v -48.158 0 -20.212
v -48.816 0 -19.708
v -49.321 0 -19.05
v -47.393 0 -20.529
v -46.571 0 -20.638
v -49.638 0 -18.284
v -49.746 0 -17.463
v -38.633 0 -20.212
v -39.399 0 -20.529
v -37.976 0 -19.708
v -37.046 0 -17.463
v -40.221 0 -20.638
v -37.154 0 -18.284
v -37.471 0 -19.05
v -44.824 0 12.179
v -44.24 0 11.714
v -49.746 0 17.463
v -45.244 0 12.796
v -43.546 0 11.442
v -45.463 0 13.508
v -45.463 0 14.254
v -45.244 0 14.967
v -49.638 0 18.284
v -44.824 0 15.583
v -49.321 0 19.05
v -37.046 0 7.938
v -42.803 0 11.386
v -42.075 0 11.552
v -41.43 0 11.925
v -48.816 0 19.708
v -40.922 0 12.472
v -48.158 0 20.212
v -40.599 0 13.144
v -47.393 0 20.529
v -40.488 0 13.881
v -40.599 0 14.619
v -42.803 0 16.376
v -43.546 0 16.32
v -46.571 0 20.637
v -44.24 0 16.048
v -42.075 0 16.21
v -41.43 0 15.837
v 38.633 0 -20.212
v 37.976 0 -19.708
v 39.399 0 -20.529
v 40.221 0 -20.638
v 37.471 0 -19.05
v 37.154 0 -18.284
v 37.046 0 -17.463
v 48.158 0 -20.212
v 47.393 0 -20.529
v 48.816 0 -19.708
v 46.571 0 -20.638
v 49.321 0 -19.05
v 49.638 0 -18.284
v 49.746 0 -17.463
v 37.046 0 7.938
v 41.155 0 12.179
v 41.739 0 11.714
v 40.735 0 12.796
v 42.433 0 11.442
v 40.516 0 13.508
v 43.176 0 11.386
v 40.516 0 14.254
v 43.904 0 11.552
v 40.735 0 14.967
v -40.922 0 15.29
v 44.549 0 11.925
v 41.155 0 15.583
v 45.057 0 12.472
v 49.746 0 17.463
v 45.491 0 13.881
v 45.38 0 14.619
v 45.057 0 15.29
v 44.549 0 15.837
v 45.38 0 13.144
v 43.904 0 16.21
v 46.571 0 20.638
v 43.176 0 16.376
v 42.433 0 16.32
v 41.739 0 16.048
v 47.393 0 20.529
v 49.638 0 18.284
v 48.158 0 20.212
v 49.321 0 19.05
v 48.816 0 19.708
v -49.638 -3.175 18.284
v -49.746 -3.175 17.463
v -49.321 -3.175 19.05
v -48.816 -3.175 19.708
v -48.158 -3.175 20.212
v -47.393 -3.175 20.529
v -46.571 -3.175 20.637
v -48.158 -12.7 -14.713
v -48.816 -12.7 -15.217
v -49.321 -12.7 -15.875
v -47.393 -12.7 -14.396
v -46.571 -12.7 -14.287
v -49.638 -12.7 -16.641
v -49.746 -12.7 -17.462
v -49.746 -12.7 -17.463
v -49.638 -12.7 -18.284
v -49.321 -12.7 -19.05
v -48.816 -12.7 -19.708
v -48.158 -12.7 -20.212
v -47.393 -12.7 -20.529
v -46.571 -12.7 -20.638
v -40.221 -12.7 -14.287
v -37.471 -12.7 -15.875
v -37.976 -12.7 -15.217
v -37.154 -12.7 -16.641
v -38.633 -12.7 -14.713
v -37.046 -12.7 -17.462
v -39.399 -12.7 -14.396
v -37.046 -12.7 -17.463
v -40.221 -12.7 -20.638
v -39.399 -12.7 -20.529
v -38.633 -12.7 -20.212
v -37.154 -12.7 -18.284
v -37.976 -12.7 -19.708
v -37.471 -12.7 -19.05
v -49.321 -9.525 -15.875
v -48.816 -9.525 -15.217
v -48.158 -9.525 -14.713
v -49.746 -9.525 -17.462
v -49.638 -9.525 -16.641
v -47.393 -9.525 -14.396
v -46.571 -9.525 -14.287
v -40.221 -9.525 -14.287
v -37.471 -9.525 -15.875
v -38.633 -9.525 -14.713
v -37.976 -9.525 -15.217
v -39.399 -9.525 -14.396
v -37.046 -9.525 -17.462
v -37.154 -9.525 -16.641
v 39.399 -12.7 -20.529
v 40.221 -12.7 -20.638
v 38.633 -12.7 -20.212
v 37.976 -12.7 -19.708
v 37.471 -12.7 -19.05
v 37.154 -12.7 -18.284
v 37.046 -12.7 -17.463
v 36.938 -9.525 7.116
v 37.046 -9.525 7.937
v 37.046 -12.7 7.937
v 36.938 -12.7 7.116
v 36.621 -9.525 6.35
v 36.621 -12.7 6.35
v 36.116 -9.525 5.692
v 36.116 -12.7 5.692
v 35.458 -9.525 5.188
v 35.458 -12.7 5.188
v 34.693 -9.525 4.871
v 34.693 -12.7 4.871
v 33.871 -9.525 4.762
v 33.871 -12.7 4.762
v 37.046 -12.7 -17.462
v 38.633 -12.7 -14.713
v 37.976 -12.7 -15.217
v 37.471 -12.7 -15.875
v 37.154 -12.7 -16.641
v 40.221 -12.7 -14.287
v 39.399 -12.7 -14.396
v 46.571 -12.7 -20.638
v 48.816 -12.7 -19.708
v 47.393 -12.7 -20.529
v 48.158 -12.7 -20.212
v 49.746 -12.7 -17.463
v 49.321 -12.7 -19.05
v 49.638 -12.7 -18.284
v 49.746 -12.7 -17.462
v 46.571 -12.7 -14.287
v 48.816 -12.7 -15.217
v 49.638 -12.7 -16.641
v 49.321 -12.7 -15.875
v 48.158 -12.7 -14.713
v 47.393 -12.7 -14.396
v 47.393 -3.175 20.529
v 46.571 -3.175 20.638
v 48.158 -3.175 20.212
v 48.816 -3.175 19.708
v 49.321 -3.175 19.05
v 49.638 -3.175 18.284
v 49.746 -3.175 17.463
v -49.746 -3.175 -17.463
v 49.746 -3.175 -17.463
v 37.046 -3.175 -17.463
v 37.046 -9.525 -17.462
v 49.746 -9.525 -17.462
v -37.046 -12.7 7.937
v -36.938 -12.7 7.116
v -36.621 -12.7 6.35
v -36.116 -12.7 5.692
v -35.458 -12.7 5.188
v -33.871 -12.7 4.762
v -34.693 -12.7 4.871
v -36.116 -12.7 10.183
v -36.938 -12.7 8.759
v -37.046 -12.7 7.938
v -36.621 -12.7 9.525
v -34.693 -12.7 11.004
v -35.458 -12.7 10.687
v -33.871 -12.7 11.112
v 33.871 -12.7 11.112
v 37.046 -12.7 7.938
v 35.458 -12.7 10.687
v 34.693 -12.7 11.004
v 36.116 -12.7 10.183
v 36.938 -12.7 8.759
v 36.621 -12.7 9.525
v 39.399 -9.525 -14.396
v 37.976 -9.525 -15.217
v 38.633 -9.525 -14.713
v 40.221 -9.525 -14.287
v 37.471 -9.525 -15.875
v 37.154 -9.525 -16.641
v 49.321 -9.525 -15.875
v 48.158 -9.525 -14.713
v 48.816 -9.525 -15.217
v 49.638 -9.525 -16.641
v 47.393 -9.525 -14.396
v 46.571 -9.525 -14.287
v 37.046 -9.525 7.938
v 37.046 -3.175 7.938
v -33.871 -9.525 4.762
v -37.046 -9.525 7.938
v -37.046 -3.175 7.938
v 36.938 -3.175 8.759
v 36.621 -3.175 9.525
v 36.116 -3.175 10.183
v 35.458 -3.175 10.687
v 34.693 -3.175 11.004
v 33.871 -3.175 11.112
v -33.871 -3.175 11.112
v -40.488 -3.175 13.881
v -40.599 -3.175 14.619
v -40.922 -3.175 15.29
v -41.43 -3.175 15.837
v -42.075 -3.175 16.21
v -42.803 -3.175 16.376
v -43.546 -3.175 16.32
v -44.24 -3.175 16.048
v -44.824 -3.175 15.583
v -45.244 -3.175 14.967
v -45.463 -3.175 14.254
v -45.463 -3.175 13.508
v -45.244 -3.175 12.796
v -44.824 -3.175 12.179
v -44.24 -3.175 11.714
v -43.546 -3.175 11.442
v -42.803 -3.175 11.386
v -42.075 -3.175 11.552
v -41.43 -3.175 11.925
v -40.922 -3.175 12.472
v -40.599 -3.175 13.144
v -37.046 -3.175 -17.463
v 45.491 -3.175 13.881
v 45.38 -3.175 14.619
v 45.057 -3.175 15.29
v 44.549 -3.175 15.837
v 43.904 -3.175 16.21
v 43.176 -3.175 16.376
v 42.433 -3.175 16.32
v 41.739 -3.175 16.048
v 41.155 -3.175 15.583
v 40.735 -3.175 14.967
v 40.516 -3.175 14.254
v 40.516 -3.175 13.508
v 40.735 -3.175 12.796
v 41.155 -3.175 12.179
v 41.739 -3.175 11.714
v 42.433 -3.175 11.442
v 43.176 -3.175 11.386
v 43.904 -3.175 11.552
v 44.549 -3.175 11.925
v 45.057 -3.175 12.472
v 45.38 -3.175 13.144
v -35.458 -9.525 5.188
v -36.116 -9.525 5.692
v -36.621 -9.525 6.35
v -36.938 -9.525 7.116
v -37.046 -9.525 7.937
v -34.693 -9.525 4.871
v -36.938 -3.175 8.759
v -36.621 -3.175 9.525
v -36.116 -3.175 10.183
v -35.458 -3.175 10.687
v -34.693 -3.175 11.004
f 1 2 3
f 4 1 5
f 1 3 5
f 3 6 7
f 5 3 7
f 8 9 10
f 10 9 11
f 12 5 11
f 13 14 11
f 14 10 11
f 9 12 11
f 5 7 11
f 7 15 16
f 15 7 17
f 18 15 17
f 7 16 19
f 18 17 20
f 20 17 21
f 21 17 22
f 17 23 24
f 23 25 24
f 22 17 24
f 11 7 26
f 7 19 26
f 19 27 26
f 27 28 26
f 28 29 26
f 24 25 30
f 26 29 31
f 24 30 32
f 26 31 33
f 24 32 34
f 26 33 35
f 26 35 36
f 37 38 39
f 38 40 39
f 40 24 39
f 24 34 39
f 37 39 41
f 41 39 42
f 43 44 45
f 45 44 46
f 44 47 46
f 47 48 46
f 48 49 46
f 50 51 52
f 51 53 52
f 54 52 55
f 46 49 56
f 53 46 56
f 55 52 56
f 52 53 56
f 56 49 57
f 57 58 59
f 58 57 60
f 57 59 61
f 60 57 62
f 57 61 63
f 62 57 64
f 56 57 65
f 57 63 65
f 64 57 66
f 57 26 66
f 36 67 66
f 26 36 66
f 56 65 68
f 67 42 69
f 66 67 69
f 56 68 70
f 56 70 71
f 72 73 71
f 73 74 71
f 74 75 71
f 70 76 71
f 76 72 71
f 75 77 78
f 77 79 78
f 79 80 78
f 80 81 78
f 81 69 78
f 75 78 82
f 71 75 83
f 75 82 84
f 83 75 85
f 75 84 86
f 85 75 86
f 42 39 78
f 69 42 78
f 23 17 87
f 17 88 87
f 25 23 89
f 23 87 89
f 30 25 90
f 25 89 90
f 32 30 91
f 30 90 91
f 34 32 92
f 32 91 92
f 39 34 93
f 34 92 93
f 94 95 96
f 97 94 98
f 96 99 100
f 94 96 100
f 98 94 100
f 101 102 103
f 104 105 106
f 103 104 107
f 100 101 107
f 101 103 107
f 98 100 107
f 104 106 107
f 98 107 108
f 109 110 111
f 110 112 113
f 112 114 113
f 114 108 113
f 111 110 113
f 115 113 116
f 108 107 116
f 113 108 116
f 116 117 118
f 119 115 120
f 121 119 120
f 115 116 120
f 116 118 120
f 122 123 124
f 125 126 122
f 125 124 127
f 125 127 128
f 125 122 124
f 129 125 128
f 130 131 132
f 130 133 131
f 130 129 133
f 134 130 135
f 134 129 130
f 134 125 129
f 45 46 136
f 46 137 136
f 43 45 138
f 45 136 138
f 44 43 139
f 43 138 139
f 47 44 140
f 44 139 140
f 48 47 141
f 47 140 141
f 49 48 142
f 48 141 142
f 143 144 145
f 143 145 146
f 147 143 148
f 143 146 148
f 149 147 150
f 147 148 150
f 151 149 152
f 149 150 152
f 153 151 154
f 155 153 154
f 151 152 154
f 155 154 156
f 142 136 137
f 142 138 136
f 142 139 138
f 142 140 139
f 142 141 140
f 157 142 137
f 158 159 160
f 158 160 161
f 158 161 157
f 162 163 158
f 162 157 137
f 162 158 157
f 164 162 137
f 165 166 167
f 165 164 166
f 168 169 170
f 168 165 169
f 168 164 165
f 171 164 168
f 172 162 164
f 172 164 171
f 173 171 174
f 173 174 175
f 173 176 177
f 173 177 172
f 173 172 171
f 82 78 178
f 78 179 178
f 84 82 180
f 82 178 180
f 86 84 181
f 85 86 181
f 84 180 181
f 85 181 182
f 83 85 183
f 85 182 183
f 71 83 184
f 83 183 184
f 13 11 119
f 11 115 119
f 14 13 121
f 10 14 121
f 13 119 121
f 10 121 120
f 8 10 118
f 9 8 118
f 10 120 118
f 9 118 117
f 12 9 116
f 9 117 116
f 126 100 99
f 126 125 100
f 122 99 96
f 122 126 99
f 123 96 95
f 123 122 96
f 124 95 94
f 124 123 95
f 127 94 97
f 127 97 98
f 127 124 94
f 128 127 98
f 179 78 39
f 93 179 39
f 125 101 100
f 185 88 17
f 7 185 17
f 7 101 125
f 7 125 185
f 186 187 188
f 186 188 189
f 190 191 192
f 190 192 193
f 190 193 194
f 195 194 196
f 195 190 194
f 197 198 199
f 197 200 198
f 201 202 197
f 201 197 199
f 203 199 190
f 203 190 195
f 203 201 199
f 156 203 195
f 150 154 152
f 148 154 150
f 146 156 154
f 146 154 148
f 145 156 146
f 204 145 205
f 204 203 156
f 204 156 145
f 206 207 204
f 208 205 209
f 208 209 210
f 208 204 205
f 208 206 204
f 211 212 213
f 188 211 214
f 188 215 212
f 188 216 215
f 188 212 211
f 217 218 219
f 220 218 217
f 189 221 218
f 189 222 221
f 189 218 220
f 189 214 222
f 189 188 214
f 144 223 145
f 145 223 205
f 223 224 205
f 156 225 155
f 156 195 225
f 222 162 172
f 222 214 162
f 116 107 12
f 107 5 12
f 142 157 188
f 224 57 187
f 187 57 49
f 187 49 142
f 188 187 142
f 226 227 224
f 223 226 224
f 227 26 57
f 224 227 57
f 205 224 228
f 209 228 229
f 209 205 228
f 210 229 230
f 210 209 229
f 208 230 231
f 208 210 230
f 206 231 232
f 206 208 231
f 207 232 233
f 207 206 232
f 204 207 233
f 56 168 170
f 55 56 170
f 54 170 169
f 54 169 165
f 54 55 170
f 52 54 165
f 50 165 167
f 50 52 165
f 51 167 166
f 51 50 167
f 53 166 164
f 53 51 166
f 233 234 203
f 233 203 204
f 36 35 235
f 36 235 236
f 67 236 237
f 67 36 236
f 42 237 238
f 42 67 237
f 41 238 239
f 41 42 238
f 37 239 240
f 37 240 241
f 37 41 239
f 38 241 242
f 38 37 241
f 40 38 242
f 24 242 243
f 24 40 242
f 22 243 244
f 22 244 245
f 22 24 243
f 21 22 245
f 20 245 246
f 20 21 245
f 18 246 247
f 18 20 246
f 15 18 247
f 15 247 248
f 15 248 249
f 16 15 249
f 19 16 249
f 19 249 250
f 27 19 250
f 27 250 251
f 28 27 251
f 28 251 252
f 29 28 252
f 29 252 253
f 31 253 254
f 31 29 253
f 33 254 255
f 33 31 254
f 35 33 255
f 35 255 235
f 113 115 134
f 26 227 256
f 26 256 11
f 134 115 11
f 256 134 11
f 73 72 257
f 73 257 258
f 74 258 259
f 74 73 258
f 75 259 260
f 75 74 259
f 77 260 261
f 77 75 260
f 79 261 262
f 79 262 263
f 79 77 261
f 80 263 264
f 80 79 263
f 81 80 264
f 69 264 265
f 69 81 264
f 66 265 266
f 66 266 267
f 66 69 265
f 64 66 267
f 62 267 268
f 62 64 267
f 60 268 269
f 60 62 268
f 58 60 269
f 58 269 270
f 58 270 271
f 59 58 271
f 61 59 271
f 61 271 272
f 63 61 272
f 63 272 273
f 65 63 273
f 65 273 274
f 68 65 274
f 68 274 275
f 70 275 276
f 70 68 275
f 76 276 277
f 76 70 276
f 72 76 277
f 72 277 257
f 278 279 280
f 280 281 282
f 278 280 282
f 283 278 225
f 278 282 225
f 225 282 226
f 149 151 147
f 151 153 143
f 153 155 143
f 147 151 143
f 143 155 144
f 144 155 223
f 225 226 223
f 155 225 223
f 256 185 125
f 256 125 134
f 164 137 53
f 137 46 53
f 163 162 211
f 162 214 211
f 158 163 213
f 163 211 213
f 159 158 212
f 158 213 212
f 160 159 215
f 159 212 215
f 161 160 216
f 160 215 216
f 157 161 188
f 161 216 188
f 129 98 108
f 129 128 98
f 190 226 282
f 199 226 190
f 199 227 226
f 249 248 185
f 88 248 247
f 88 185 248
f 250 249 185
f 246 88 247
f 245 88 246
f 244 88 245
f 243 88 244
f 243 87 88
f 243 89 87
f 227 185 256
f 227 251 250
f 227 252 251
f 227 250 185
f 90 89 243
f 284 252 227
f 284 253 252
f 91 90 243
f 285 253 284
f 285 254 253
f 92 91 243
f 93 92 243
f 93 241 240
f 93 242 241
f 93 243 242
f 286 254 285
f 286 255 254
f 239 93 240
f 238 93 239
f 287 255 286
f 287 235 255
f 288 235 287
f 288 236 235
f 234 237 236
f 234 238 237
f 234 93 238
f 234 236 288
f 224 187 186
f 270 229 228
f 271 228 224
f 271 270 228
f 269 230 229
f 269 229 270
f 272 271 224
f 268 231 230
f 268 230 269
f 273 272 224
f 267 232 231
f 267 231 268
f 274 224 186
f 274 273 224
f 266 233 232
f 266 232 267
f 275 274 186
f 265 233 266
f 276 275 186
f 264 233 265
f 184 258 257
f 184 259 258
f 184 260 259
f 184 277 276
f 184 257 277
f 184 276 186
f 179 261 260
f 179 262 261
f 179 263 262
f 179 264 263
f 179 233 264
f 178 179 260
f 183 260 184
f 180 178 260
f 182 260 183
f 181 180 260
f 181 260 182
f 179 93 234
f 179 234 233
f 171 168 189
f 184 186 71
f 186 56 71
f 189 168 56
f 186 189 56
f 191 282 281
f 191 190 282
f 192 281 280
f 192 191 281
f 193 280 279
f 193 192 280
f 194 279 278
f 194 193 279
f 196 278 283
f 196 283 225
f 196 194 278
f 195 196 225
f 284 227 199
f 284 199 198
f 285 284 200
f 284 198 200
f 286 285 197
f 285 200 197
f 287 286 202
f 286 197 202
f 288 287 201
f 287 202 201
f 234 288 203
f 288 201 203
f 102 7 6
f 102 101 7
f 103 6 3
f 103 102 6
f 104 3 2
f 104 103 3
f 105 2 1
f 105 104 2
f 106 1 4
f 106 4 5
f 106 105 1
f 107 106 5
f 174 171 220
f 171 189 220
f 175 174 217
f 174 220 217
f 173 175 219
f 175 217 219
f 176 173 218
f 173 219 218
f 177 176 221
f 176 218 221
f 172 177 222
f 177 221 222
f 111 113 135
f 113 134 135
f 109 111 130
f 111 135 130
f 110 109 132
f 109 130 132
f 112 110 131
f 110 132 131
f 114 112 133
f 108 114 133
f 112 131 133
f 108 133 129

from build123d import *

# Parameters (mm, degrees)
F0_R     = 2.5019
F1_DEPTH = 3.175
F2_W     = 12.7
F2_H     = 3.175
F2_W_2   = 74.0918
F3_DEPTH = 9.525
F4_W     = 12.7
F4_H     = 3.175
F5_W     = 12.7
F5_H     = 3.175
F6_DEPTH = 3.175
F7_W     = 74.0918
F7_H     = 3.175
F8_DEPTH = 3.175
F9_R     = 3.17499


# Not quite as in the source:
# - a fillet or chamfer is up to 0.001 mm smaller than in the source, because OpenCascade refuses the exact size
# - a feature names something its author has since deleted; it is built from what else it names


with BuildPart() as f1:
    # F0 (on Front) → F1 (new body)
    with BuildSketch(Plane.XZ):
        Polygon((49.7459, 20.6375), (-49.7459, 20.6375), (-49.7459, -20.6375), (-37.0459, -20.6375), (-37.0459, 7.9375), (37.0459, 7.9375), (37.0459, -20.6375), (49.7459, -20.6375), align=None)
        with Locations((-42.9895, 13.8811)):
            Circle(F0_R, mode=Mode.SUBTRACT)
        with Locations((42.9895, 13.8811)):
            Circle(F0_R, mode=Mode.SUBTRACT)
    extrude(amount=F1_DEPTH)

    # F2 (on face) → F3 (join)
    with BuildSketch(Plane.XZ.offset(3.175)):
        with Locations((-43.3959, -19.05)):
            Rectangle(F2_W, F2_H)
        with Locations((0, 9.525)):
            Rectangle(F2_W_2, F2_H)
        with Locations((43.3959, -19.05)):
            Rectangle(F2_W, F2_H)
    extrude(amount=F3_DEPTH)

    # F4 (on face) + F5 (on face) → F6 (join)
    with BuildSketch(Plane.XY.offset(-17.4625)):
        with Locations((-43.3959, -11.1125)):
            Rectangle(F4_W, F4_H)
    with BuildSketch(Plane.XY.offset(-17.4625)):
        with Locations((43.3959, -11.1125)):
            Rectangle(F5_W, F5_H)
    extrude(amount=F6_DEPTH)

    # F7 (on face) → F8 (join)
    with BuildSketch(Plane(origin=(0, 0, 7.9375), x_dir=(1, 0, 0), z_dir=(0, 0, -1))):
        with Locations((0, 11.1125)):
            Rectangle(F7_W, F7_H)
    extrude(amount=F8_DEPTH)

    # F9 (radius 3.175 in the source; OpenCascade refuses exactly that, so slightly less here)
    f9_edges = [f1.edges().sort_by_distance(p)[0] for p in [
        (-49.7459, -1.5875, 20.6375),
        (-49.7459, -6.35, -20.6375),
        (-49.7459, -11.1125, -14.2875),
        (-37.0459, -7.9375, 11.1125),
        (-37.0459, -11.1125, 4.7625),
        (-37.0459, -11.1125, -14.2875),
        (-37.0459, -6.35, -20.6375),
        (49.7459, -1.5875, 20.6375),
        (49.7459, -6.35, -20.6375),
        (37.0459, -7.9375, 11.1125),
        (37.0459, -11.1125, 4.7625),
        (37.0459, -11.1125, -14.2875),
        (37.0459, -6.35, -20.6375),
        (49.7459, -11.1125, -14.2875),
    ]]
    fillet(f9_edges, radius=F9_R)


solid = f1.part
